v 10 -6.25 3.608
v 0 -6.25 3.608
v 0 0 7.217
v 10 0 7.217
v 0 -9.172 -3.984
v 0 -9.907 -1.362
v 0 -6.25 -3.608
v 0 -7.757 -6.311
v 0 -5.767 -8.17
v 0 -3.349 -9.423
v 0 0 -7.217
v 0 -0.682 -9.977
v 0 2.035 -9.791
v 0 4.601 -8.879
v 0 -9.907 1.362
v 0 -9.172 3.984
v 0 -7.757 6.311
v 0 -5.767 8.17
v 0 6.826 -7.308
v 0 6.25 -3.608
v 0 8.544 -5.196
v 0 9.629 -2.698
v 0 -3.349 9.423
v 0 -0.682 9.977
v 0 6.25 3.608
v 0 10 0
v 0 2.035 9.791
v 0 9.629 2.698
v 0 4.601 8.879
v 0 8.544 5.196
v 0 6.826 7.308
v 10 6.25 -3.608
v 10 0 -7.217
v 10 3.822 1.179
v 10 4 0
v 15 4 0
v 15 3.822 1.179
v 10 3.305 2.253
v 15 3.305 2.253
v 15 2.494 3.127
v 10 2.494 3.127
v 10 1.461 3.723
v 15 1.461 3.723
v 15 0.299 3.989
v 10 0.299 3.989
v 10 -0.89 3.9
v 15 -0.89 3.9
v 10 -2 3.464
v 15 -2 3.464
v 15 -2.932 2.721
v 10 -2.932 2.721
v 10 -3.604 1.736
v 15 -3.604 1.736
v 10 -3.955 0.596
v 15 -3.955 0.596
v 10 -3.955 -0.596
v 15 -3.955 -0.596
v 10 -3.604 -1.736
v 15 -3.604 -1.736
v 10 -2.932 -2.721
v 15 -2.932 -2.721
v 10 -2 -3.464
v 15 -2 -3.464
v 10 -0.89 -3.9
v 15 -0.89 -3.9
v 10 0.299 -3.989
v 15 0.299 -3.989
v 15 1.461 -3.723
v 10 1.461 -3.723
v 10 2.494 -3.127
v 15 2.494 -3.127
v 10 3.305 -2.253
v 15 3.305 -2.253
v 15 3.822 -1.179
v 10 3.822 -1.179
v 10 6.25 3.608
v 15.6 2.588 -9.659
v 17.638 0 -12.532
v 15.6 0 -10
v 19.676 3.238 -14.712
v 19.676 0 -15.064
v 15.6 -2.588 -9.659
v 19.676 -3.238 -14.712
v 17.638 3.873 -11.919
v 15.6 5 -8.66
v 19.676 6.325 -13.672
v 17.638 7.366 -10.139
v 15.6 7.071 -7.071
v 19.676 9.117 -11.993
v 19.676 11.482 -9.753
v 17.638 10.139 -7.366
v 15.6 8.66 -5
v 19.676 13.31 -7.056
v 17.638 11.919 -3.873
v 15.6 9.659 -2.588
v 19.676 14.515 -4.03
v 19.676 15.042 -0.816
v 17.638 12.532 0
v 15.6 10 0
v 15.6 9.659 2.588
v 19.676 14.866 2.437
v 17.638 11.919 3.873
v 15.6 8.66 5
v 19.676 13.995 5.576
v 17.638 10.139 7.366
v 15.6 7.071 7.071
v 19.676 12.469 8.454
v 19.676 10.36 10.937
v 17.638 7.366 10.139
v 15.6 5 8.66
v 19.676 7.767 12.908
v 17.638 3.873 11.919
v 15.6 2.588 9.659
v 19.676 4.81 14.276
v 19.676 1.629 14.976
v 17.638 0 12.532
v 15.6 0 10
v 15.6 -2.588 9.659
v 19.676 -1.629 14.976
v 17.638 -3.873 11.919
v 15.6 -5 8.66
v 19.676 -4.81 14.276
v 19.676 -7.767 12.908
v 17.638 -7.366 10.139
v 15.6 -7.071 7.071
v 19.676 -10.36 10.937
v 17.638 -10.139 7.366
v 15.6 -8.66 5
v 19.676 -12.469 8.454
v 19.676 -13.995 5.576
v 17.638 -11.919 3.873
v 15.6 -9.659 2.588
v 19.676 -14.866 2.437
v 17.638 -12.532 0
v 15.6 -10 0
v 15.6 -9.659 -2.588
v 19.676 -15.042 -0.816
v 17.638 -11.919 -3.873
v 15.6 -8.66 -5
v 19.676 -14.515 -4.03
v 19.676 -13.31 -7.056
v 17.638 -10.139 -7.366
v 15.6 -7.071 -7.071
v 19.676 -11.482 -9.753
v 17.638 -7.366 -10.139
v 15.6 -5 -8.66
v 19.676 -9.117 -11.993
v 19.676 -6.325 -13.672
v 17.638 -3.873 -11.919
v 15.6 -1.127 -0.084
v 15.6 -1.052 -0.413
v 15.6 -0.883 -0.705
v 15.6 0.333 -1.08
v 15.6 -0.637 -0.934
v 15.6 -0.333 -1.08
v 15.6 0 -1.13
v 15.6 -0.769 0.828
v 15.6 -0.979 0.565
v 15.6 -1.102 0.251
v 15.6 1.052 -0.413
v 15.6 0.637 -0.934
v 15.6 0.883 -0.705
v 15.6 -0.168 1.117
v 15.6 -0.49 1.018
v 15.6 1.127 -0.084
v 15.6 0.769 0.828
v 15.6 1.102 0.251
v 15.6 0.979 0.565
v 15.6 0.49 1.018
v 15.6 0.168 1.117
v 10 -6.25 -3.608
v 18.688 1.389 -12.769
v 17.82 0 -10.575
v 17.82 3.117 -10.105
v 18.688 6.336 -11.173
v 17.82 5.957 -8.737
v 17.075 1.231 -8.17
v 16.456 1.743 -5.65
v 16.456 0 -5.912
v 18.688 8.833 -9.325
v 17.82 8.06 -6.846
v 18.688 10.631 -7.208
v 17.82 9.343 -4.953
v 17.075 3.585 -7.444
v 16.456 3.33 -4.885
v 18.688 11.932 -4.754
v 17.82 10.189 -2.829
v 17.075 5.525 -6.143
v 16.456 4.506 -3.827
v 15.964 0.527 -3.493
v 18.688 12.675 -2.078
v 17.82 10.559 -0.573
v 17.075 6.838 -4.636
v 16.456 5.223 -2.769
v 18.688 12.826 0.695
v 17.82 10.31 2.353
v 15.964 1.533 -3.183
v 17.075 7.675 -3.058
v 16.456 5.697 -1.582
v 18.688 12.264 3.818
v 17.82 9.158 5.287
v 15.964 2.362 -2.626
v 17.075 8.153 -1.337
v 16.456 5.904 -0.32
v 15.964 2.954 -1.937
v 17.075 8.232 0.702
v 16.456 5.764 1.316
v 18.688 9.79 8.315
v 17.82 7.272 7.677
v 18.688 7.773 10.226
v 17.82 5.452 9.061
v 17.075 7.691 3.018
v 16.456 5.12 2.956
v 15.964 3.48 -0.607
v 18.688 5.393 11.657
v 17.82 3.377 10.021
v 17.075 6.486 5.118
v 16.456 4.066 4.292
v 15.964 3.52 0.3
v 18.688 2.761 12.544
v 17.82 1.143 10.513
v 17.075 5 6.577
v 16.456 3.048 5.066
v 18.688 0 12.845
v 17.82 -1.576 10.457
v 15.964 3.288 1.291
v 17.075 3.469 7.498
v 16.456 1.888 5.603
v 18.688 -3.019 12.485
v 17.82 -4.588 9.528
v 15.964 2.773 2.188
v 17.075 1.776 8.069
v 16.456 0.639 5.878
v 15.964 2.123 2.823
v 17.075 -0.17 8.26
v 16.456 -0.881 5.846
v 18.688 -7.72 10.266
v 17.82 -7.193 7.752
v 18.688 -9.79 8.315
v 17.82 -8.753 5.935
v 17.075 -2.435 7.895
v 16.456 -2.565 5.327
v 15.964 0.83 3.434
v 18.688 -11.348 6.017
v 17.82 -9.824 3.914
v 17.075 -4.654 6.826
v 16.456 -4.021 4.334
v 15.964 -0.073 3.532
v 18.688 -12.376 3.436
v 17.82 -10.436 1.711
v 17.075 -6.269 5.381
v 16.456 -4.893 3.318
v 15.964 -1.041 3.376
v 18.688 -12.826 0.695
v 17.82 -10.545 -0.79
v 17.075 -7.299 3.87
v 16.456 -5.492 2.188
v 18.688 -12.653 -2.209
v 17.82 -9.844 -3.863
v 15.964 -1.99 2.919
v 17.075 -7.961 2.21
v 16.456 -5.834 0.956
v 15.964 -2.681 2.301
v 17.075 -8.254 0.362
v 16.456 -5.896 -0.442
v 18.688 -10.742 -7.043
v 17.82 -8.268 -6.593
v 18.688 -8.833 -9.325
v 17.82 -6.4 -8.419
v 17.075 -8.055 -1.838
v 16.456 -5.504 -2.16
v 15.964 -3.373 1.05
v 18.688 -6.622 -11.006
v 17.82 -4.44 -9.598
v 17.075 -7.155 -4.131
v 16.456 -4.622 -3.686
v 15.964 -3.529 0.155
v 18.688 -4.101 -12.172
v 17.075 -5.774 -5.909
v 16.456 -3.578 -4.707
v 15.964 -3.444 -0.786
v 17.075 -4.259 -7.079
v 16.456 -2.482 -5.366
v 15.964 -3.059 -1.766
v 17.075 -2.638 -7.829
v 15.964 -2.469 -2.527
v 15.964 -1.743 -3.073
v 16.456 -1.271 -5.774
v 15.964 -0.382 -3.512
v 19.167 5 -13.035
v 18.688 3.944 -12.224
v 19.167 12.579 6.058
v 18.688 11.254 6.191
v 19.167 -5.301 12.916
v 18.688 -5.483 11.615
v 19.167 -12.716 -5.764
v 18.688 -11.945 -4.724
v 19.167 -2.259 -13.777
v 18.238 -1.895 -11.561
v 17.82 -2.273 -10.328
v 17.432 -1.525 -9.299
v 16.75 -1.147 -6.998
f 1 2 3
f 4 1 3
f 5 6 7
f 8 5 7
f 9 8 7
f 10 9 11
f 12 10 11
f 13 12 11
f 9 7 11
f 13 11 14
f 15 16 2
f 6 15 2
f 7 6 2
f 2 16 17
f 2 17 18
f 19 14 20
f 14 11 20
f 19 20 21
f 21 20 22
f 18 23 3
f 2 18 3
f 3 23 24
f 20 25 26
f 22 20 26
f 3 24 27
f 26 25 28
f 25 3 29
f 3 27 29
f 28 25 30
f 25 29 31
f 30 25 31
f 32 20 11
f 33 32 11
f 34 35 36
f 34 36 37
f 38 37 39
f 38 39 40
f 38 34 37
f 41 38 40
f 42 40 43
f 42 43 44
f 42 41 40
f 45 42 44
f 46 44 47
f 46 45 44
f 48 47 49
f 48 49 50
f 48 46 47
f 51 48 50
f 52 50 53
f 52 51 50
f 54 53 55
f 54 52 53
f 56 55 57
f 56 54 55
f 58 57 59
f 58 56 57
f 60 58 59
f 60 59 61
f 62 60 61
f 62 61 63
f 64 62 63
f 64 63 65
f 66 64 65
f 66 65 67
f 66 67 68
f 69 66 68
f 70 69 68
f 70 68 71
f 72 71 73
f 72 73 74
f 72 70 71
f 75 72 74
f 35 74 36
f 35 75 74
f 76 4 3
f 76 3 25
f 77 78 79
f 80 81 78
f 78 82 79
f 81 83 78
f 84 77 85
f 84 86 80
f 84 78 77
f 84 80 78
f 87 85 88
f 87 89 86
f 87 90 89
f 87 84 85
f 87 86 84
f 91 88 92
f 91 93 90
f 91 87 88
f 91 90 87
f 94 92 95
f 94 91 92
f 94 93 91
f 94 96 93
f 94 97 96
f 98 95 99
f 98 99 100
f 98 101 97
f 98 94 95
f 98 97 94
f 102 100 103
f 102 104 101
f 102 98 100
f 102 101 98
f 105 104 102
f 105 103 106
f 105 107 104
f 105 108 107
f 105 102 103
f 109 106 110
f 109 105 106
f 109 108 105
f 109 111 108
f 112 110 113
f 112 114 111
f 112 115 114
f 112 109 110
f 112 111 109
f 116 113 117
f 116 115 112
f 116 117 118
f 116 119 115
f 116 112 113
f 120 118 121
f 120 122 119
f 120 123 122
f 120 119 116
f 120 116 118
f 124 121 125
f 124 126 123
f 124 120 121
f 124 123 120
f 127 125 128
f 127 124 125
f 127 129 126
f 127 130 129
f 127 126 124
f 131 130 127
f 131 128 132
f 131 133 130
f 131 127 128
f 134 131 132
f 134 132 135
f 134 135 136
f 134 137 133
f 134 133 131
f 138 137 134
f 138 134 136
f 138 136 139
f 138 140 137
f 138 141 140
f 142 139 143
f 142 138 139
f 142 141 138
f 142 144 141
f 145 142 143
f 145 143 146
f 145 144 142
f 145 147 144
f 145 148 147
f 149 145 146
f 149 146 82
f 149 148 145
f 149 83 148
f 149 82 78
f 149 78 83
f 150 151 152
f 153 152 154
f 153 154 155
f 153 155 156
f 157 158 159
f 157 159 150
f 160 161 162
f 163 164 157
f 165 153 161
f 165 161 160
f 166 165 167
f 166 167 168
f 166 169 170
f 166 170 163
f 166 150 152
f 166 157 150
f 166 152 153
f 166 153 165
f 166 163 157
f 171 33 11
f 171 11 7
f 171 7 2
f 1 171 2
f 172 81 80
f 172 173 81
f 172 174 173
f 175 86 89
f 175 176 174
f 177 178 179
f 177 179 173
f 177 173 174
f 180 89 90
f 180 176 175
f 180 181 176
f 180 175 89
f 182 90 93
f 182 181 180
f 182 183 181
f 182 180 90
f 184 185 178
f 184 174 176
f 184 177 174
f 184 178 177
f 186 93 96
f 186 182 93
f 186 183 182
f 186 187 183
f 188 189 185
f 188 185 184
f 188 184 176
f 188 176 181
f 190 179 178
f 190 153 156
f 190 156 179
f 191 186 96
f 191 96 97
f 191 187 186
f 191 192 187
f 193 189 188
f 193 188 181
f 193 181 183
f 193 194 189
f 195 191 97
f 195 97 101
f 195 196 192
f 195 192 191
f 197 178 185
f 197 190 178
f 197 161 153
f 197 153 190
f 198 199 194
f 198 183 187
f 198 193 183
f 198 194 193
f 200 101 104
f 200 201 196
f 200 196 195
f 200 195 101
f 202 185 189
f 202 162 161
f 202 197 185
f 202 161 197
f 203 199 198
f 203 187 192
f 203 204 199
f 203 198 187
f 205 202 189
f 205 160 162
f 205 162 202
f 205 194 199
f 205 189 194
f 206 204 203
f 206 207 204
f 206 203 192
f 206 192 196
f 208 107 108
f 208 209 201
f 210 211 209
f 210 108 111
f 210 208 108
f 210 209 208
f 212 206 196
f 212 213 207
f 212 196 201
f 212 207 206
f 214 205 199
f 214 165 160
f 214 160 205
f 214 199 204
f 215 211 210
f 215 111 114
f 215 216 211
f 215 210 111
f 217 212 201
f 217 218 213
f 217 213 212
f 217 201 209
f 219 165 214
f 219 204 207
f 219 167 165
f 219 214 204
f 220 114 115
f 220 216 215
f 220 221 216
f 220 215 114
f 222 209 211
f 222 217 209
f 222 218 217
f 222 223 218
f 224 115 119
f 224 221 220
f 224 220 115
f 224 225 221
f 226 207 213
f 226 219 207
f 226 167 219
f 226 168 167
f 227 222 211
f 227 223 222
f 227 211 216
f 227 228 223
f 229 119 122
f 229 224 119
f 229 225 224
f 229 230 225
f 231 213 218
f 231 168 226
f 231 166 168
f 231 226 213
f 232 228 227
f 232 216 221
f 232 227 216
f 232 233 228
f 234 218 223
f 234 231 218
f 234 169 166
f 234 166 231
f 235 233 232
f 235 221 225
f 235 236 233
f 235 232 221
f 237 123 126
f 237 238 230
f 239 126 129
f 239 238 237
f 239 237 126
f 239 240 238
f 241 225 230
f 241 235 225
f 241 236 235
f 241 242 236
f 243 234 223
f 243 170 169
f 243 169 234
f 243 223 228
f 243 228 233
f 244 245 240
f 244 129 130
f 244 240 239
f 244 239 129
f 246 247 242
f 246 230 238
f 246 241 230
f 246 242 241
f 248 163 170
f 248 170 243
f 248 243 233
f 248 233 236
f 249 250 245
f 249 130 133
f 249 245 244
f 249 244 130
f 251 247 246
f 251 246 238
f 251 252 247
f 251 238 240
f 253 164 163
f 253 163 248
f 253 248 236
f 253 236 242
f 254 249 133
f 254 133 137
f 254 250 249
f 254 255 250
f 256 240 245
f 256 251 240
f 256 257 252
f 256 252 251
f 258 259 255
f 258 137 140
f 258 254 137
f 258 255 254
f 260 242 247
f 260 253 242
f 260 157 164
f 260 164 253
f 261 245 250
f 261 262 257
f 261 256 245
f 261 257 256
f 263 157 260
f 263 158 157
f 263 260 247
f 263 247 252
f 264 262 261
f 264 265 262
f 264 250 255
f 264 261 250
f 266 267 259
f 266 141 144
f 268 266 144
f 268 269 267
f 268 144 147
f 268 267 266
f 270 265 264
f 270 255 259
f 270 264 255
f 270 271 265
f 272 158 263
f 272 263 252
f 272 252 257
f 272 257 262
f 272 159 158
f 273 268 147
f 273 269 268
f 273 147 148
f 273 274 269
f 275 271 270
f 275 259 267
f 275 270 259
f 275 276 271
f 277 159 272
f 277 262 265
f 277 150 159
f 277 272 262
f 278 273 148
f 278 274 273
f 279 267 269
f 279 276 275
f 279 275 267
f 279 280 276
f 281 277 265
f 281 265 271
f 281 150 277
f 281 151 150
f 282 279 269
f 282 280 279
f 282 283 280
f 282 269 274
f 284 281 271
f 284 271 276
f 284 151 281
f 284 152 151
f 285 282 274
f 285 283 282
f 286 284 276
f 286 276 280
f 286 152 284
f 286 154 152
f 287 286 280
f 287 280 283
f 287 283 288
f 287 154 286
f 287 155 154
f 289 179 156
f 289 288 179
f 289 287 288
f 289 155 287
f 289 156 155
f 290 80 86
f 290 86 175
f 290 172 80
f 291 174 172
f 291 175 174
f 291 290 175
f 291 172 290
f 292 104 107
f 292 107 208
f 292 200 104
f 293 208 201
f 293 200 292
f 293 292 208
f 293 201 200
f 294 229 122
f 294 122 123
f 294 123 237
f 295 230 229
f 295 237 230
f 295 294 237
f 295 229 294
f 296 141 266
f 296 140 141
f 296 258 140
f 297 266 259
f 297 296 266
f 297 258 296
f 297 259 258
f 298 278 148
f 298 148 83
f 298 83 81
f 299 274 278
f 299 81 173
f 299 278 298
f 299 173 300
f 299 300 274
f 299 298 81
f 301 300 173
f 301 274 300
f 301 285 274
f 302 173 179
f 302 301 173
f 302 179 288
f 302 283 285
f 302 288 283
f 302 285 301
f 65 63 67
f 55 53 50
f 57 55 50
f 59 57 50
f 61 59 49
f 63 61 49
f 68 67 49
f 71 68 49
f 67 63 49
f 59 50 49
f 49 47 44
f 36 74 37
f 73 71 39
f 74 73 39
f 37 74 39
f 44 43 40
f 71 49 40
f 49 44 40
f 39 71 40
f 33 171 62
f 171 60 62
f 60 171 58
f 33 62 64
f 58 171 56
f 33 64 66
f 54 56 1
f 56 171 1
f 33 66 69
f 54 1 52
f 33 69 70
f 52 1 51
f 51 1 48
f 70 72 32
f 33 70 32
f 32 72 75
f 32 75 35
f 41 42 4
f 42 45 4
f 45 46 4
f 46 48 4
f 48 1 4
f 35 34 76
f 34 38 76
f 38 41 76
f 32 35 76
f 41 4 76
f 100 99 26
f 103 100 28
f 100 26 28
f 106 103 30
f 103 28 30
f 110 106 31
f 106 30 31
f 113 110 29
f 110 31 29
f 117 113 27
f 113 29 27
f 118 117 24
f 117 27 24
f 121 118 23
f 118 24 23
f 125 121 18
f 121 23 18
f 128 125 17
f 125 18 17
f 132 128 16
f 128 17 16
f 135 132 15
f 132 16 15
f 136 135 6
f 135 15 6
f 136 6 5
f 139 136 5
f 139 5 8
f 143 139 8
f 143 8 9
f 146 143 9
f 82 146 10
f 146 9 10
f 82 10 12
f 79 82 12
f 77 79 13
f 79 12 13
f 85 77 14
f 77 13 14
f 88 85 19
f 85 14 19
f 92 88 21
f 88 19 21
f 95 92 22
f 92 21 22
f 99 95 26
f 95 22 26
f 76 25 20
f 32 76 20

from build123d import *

# Parameters (mm, degrees)
F0_R     = 10
F1_DEPTH = 10
F2_R     = 10
F2_R_2   = 4
F3_DEPTH = 5
F4_R     = 10
F5_DEPTH = 0.6


with BuildPart() as f1:
    # F0 (on Right) → F1 (new body)
    with BuildSketch(Plane.YZ):
        Circle(F0_R)
        Polygon((0, 7.2168783649), (6.25, 3.6084391824), (6.25, -3.6084391824), (0, -7.2168783649), (-6.25, -3.6084391824), (-6.25, 3.6084391824), align=None, mode=Mode.SUBTRACT)
    extrude(amount=F1_DEPTH)

    # F2 (on face) → F3 (join)
    with BuildSketch(Plane.YZ.offset(10)):
        Circle(F2_R)
        Polygon((-6.25, 3.6084391824), (0, 7.2168783649), (6.25, 3.6084391824), (6.25, -3.6084391824), (0, -7.2168783649), (-6.25, -3.6084391824), align=None, mode=Mode.SUBTRACT)
        Polygon((6.25, 3.6084391824), (0, 7.2168783649), (-6.25, 3.6084391824), (-6.25, -3.6084391824), (0, -7.2168783649), (6.25, -3.6084391824), align=None)
        Circle(F2_R_2, mode=Mode.SUBTRACT)
    extrude(amount=F3_DEPTH)

    # F4 (on face) → F5 (join)
    with BuildSketch(Plane.YZ.offset(15)):
        Circle(F4_R)
    extrude(amount=F5_DEPTH)

    # F6 (on Front) → F7 (revolve)
    with BuildSketch(Plane.XZ):
        with BuildLine():
            ThreePointArc((19.6760818362, -15.0644853711), (17.075219414, -8.2618948834), (15.6, -1.1300332496))
            Line((15.6, -1.1300332496), (15.6, -10))
            Line((15.6, -10), (19.6760818362, -15.0644853711))
        make_face()
    revolve(axis=Axis((11.1028458923, 0, 0), (1, 0, 0)))


solid = f1.part
